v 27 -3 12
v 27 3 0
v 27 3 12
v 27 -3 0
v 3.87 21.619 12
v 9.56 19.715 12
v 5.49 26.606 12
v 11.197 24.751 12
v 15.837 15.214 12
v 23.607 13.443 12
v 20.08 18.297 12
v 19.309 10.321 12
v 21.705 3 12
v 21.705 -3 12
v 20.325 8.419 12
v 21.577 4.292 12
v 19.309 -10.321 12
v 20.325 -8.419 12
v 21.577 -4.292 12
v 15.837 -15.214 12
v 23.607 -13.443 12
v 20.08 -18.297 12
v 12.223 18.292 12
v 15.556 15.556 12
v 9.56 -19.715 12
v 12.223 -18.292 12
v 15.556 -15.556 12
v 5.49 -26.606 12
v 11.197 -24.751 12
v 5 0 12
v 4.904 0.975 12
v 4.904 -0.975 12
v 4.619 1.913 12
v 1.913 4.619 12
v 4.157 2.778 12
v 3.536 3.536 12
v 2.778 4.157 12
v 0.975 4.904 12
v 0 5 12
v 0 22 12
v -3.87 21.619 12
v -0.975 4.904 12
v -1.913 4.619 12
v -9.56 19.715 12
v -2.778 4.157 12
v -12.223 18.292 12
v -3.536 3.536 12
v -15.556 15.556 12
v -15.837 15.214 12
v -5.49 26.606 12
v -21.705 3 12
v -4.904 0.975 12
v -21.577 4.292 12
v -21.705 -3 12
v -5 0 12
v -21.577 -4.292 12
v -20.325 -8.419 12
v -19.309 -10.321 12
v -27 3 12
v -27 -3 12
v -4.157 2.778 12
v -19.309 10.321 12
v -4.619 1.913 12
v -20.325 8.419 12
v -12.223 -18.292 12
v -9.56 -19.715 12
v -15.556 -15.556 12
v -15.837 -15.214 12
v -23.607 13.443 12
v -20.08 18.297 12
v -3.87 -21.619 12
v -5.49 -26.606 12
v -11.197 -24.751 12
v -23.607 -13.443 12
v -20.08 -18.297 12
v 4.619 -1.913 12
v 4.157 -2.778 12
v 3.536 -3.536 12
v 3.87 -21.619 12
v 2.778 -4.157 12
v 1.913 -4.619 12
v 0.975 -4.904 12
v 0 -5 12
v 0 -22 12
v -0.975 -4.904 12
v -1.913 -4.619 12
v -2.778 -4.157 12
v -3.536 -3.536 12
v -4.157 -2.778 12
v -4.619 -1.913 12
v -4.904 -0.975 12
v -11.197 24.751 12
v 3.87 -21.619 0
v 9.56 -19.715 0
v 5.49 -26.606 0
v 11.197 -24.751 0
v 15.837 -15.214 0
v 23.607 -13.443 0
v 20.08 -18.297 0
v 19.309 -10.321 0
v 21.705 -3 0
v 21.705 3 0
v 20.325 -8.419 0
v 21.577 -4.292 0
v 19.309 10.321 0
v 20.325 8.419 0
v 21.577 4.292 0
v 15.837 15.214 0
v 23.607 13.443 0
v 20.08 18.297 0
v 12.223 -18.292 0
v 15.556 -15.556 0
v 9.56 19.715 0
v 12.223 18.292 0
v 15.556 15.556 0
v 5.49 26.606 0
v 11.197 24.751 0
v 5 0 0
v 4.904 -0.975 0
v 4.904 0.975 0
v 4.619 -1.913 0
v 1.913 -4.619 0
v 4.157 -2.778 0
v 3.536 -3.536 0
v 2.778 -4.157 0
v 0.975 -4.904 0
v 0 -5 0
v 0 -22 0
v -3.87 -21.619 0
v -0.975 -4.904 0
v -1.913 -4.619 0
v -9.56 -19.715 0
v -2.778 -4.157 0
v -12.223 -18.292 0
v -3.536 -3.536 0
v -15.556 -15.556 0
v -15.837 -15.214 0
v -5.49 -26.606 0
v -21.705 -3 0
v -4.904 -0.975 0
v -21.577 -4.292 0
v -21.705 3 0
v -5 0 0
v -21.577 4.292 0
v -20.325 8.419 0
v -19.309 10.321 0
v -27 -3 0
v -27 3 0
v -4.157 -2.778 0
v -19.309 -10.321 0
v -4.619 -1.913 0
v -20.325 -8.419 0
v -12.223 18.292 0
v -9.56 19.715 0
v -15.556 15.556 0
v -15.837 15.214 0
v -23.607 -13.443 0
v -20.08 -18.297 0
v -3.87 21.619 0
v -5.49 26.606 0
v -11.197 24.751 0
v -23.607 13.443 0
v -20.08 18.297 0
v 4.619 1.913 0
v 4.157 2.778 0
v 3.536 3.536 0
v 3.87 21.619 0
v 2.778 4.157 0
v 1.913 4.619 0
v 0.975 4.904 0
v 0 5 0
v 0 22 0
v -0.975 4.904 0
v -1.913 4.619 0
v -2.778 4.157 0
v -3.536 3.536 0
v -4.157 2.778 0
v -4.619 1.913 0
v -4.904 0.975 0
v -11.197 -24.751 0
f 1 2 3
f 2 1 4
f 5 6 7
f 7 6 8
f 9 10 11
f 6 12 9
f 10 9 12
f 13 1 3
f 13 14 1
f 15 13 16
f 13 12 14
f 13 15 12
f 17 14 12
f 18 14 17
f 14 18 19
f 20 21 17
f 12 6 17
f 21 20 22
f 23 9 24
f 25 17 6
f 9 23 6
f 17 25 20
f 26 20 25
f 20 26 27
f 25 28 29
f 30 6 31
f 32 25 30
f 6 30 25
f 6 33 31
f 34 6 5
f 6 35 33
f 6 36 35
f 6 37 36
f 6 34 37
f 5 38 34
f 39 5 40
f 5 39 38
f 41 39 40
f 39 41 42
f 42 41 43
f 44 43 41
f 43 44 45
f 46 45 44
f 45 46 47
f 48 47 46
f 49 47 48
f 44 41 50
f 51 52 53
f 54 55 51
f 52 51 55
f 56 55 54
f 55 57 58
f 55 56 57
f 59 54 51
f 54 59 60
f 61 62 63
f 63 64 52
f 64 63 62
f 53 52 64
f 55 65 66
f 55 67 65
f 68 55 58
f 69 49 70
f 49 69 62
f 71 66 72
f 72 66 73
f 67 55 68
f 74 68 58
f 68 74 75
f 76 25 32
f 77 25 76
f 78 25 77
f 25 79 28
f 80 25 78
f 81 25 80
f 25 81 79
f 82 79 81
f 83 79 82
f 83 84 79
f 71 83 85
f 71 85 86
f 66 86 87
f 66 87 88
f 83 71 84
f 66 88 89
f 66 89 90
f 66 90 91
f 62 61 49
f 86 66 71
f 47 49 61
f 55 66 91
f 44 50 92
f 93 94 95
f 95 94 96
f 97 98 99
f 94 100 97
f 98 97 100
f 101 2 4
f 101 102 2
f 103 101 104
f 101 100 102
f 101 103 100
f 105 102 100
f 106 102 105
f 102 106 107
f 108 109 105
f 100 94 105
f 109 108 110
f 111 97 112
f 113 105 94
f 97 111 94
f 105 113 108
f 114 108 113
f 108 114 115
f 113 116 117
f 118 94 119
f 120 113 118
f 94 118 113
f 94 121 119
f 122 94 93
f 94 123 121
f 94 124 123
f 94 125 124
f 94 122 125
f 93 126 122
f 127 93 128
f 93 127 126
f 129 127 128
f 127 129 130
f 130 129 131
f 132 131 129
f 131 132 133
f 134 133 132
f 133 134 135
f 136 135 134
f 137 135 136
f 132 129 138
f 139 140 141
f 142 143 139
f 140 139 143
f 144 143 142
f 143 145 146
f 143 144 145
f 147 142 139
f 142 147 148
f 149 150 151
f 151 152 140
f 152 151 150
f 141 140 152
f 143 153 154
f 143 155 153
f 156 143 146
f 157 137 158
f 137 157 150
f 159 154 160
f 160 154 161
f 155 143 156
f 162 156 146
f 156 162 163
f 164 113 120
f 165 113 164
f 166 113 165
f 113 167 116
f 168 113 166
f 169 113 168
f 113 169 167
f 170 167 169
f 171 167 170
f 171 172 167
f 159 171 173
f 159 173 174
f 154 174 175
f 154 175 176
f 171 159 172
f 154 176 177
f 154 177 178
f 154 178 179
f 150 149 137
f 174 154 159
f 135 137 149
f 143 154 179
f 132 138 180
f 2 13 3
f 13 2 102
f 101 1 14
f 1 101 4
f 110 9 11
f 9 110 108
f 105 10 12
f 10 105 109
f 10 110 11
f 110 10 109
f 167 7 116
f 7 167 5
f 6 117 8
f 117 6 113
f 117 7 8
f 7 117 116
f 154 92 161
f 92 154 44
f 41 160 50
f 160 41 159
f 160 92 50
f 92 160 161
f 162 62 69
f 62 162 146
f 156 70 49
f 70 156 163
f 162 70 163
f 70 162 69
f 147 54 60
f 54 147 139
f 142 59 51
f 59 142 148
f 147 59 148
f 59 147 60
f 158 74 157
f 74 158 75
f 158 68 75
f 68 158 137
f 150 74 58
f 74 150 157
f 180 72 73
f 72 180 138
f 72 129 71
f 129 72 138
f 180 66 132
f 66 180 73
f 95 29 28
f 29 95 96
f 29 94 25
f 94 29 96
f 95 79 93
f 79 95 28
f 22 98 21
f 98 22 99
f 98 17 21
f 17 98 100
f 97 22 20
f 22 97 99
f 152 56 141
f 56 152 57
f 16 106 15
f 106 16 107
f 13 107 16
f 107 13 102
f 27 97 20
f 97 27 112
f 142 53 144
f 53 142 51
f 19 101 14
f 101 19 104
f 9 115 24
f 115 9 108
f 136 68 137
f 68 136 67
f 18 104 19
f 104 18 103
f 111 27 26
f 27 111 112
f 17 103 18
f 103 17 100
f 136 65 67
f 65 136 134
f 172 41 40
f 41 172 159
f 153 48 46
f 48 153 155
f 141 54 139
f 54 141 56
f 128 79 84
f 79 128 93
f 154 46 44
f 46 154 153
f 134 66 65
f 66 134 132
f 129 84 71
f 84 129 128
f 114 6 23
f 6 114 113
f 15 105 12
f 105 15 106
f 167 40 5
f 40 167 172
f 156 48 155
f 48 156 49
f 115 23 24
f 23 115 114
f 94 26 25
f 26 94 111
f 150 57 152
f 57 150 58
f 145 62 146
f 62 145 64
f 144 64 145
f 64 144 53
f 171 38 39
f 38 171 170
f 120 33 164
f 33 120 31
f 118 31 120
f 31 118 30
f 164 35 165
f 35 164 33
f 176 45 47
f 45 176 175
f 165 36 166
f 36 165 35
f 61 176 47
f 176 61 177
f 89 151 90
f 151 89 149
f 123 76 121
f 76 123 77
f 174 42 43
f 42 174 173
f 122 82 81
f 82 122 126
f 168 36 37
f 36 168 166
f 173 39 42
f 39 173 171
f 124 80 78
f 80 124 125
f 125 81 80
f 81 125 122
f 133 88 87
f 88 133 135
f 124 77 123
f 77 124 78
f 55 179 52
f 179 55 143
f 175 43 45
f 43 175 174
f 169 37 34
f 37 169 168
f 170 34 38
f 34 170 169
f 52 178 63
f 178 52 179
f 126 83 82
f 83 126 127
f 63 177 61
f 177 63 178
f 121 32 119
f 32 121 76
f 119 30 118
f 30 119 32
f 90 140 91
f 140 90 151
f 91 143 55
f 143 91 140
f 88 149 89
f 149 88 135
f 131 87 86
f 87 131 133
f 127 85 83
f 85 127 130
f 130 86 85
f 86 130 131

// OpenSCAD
$fn = 32;

// ----------------------------------------------------------------------
// Spur blank: bored gear blank
// ----------------------------------------------------------------------

// --- parameters (mm) ---
disc_r = 22;              // blank root radius
disc_t = 12;              // blank thickness
n_teeth = 10;             // stub tooth count
tooth_w = 6;              // tooth width at the root
tooth_h = 5;              // tooth height above the root
bore_r = 5;               // central bore radius

out_r = disc_r + tooth_h;  // tip radius
bbox_x = 54.0;  // measured width over the teeth
bbox_y = 53.21;  // measured depth over the teeth

difference() {
union() {
  cylinder(r = disc_r, h = disc_t);
  for (i = [0 : n_teeth - 1])
    rotate([0, 0, i * 360 / n_teeth])
      translate([disc_r - 1, -tooth_w / 2, 0])
        cube([tooth_h + 1, tooth_w, disc_t]);
}
  translate([0, 0, -1]) cylinder(r = bore_r, h = disc_t + 2);
}
